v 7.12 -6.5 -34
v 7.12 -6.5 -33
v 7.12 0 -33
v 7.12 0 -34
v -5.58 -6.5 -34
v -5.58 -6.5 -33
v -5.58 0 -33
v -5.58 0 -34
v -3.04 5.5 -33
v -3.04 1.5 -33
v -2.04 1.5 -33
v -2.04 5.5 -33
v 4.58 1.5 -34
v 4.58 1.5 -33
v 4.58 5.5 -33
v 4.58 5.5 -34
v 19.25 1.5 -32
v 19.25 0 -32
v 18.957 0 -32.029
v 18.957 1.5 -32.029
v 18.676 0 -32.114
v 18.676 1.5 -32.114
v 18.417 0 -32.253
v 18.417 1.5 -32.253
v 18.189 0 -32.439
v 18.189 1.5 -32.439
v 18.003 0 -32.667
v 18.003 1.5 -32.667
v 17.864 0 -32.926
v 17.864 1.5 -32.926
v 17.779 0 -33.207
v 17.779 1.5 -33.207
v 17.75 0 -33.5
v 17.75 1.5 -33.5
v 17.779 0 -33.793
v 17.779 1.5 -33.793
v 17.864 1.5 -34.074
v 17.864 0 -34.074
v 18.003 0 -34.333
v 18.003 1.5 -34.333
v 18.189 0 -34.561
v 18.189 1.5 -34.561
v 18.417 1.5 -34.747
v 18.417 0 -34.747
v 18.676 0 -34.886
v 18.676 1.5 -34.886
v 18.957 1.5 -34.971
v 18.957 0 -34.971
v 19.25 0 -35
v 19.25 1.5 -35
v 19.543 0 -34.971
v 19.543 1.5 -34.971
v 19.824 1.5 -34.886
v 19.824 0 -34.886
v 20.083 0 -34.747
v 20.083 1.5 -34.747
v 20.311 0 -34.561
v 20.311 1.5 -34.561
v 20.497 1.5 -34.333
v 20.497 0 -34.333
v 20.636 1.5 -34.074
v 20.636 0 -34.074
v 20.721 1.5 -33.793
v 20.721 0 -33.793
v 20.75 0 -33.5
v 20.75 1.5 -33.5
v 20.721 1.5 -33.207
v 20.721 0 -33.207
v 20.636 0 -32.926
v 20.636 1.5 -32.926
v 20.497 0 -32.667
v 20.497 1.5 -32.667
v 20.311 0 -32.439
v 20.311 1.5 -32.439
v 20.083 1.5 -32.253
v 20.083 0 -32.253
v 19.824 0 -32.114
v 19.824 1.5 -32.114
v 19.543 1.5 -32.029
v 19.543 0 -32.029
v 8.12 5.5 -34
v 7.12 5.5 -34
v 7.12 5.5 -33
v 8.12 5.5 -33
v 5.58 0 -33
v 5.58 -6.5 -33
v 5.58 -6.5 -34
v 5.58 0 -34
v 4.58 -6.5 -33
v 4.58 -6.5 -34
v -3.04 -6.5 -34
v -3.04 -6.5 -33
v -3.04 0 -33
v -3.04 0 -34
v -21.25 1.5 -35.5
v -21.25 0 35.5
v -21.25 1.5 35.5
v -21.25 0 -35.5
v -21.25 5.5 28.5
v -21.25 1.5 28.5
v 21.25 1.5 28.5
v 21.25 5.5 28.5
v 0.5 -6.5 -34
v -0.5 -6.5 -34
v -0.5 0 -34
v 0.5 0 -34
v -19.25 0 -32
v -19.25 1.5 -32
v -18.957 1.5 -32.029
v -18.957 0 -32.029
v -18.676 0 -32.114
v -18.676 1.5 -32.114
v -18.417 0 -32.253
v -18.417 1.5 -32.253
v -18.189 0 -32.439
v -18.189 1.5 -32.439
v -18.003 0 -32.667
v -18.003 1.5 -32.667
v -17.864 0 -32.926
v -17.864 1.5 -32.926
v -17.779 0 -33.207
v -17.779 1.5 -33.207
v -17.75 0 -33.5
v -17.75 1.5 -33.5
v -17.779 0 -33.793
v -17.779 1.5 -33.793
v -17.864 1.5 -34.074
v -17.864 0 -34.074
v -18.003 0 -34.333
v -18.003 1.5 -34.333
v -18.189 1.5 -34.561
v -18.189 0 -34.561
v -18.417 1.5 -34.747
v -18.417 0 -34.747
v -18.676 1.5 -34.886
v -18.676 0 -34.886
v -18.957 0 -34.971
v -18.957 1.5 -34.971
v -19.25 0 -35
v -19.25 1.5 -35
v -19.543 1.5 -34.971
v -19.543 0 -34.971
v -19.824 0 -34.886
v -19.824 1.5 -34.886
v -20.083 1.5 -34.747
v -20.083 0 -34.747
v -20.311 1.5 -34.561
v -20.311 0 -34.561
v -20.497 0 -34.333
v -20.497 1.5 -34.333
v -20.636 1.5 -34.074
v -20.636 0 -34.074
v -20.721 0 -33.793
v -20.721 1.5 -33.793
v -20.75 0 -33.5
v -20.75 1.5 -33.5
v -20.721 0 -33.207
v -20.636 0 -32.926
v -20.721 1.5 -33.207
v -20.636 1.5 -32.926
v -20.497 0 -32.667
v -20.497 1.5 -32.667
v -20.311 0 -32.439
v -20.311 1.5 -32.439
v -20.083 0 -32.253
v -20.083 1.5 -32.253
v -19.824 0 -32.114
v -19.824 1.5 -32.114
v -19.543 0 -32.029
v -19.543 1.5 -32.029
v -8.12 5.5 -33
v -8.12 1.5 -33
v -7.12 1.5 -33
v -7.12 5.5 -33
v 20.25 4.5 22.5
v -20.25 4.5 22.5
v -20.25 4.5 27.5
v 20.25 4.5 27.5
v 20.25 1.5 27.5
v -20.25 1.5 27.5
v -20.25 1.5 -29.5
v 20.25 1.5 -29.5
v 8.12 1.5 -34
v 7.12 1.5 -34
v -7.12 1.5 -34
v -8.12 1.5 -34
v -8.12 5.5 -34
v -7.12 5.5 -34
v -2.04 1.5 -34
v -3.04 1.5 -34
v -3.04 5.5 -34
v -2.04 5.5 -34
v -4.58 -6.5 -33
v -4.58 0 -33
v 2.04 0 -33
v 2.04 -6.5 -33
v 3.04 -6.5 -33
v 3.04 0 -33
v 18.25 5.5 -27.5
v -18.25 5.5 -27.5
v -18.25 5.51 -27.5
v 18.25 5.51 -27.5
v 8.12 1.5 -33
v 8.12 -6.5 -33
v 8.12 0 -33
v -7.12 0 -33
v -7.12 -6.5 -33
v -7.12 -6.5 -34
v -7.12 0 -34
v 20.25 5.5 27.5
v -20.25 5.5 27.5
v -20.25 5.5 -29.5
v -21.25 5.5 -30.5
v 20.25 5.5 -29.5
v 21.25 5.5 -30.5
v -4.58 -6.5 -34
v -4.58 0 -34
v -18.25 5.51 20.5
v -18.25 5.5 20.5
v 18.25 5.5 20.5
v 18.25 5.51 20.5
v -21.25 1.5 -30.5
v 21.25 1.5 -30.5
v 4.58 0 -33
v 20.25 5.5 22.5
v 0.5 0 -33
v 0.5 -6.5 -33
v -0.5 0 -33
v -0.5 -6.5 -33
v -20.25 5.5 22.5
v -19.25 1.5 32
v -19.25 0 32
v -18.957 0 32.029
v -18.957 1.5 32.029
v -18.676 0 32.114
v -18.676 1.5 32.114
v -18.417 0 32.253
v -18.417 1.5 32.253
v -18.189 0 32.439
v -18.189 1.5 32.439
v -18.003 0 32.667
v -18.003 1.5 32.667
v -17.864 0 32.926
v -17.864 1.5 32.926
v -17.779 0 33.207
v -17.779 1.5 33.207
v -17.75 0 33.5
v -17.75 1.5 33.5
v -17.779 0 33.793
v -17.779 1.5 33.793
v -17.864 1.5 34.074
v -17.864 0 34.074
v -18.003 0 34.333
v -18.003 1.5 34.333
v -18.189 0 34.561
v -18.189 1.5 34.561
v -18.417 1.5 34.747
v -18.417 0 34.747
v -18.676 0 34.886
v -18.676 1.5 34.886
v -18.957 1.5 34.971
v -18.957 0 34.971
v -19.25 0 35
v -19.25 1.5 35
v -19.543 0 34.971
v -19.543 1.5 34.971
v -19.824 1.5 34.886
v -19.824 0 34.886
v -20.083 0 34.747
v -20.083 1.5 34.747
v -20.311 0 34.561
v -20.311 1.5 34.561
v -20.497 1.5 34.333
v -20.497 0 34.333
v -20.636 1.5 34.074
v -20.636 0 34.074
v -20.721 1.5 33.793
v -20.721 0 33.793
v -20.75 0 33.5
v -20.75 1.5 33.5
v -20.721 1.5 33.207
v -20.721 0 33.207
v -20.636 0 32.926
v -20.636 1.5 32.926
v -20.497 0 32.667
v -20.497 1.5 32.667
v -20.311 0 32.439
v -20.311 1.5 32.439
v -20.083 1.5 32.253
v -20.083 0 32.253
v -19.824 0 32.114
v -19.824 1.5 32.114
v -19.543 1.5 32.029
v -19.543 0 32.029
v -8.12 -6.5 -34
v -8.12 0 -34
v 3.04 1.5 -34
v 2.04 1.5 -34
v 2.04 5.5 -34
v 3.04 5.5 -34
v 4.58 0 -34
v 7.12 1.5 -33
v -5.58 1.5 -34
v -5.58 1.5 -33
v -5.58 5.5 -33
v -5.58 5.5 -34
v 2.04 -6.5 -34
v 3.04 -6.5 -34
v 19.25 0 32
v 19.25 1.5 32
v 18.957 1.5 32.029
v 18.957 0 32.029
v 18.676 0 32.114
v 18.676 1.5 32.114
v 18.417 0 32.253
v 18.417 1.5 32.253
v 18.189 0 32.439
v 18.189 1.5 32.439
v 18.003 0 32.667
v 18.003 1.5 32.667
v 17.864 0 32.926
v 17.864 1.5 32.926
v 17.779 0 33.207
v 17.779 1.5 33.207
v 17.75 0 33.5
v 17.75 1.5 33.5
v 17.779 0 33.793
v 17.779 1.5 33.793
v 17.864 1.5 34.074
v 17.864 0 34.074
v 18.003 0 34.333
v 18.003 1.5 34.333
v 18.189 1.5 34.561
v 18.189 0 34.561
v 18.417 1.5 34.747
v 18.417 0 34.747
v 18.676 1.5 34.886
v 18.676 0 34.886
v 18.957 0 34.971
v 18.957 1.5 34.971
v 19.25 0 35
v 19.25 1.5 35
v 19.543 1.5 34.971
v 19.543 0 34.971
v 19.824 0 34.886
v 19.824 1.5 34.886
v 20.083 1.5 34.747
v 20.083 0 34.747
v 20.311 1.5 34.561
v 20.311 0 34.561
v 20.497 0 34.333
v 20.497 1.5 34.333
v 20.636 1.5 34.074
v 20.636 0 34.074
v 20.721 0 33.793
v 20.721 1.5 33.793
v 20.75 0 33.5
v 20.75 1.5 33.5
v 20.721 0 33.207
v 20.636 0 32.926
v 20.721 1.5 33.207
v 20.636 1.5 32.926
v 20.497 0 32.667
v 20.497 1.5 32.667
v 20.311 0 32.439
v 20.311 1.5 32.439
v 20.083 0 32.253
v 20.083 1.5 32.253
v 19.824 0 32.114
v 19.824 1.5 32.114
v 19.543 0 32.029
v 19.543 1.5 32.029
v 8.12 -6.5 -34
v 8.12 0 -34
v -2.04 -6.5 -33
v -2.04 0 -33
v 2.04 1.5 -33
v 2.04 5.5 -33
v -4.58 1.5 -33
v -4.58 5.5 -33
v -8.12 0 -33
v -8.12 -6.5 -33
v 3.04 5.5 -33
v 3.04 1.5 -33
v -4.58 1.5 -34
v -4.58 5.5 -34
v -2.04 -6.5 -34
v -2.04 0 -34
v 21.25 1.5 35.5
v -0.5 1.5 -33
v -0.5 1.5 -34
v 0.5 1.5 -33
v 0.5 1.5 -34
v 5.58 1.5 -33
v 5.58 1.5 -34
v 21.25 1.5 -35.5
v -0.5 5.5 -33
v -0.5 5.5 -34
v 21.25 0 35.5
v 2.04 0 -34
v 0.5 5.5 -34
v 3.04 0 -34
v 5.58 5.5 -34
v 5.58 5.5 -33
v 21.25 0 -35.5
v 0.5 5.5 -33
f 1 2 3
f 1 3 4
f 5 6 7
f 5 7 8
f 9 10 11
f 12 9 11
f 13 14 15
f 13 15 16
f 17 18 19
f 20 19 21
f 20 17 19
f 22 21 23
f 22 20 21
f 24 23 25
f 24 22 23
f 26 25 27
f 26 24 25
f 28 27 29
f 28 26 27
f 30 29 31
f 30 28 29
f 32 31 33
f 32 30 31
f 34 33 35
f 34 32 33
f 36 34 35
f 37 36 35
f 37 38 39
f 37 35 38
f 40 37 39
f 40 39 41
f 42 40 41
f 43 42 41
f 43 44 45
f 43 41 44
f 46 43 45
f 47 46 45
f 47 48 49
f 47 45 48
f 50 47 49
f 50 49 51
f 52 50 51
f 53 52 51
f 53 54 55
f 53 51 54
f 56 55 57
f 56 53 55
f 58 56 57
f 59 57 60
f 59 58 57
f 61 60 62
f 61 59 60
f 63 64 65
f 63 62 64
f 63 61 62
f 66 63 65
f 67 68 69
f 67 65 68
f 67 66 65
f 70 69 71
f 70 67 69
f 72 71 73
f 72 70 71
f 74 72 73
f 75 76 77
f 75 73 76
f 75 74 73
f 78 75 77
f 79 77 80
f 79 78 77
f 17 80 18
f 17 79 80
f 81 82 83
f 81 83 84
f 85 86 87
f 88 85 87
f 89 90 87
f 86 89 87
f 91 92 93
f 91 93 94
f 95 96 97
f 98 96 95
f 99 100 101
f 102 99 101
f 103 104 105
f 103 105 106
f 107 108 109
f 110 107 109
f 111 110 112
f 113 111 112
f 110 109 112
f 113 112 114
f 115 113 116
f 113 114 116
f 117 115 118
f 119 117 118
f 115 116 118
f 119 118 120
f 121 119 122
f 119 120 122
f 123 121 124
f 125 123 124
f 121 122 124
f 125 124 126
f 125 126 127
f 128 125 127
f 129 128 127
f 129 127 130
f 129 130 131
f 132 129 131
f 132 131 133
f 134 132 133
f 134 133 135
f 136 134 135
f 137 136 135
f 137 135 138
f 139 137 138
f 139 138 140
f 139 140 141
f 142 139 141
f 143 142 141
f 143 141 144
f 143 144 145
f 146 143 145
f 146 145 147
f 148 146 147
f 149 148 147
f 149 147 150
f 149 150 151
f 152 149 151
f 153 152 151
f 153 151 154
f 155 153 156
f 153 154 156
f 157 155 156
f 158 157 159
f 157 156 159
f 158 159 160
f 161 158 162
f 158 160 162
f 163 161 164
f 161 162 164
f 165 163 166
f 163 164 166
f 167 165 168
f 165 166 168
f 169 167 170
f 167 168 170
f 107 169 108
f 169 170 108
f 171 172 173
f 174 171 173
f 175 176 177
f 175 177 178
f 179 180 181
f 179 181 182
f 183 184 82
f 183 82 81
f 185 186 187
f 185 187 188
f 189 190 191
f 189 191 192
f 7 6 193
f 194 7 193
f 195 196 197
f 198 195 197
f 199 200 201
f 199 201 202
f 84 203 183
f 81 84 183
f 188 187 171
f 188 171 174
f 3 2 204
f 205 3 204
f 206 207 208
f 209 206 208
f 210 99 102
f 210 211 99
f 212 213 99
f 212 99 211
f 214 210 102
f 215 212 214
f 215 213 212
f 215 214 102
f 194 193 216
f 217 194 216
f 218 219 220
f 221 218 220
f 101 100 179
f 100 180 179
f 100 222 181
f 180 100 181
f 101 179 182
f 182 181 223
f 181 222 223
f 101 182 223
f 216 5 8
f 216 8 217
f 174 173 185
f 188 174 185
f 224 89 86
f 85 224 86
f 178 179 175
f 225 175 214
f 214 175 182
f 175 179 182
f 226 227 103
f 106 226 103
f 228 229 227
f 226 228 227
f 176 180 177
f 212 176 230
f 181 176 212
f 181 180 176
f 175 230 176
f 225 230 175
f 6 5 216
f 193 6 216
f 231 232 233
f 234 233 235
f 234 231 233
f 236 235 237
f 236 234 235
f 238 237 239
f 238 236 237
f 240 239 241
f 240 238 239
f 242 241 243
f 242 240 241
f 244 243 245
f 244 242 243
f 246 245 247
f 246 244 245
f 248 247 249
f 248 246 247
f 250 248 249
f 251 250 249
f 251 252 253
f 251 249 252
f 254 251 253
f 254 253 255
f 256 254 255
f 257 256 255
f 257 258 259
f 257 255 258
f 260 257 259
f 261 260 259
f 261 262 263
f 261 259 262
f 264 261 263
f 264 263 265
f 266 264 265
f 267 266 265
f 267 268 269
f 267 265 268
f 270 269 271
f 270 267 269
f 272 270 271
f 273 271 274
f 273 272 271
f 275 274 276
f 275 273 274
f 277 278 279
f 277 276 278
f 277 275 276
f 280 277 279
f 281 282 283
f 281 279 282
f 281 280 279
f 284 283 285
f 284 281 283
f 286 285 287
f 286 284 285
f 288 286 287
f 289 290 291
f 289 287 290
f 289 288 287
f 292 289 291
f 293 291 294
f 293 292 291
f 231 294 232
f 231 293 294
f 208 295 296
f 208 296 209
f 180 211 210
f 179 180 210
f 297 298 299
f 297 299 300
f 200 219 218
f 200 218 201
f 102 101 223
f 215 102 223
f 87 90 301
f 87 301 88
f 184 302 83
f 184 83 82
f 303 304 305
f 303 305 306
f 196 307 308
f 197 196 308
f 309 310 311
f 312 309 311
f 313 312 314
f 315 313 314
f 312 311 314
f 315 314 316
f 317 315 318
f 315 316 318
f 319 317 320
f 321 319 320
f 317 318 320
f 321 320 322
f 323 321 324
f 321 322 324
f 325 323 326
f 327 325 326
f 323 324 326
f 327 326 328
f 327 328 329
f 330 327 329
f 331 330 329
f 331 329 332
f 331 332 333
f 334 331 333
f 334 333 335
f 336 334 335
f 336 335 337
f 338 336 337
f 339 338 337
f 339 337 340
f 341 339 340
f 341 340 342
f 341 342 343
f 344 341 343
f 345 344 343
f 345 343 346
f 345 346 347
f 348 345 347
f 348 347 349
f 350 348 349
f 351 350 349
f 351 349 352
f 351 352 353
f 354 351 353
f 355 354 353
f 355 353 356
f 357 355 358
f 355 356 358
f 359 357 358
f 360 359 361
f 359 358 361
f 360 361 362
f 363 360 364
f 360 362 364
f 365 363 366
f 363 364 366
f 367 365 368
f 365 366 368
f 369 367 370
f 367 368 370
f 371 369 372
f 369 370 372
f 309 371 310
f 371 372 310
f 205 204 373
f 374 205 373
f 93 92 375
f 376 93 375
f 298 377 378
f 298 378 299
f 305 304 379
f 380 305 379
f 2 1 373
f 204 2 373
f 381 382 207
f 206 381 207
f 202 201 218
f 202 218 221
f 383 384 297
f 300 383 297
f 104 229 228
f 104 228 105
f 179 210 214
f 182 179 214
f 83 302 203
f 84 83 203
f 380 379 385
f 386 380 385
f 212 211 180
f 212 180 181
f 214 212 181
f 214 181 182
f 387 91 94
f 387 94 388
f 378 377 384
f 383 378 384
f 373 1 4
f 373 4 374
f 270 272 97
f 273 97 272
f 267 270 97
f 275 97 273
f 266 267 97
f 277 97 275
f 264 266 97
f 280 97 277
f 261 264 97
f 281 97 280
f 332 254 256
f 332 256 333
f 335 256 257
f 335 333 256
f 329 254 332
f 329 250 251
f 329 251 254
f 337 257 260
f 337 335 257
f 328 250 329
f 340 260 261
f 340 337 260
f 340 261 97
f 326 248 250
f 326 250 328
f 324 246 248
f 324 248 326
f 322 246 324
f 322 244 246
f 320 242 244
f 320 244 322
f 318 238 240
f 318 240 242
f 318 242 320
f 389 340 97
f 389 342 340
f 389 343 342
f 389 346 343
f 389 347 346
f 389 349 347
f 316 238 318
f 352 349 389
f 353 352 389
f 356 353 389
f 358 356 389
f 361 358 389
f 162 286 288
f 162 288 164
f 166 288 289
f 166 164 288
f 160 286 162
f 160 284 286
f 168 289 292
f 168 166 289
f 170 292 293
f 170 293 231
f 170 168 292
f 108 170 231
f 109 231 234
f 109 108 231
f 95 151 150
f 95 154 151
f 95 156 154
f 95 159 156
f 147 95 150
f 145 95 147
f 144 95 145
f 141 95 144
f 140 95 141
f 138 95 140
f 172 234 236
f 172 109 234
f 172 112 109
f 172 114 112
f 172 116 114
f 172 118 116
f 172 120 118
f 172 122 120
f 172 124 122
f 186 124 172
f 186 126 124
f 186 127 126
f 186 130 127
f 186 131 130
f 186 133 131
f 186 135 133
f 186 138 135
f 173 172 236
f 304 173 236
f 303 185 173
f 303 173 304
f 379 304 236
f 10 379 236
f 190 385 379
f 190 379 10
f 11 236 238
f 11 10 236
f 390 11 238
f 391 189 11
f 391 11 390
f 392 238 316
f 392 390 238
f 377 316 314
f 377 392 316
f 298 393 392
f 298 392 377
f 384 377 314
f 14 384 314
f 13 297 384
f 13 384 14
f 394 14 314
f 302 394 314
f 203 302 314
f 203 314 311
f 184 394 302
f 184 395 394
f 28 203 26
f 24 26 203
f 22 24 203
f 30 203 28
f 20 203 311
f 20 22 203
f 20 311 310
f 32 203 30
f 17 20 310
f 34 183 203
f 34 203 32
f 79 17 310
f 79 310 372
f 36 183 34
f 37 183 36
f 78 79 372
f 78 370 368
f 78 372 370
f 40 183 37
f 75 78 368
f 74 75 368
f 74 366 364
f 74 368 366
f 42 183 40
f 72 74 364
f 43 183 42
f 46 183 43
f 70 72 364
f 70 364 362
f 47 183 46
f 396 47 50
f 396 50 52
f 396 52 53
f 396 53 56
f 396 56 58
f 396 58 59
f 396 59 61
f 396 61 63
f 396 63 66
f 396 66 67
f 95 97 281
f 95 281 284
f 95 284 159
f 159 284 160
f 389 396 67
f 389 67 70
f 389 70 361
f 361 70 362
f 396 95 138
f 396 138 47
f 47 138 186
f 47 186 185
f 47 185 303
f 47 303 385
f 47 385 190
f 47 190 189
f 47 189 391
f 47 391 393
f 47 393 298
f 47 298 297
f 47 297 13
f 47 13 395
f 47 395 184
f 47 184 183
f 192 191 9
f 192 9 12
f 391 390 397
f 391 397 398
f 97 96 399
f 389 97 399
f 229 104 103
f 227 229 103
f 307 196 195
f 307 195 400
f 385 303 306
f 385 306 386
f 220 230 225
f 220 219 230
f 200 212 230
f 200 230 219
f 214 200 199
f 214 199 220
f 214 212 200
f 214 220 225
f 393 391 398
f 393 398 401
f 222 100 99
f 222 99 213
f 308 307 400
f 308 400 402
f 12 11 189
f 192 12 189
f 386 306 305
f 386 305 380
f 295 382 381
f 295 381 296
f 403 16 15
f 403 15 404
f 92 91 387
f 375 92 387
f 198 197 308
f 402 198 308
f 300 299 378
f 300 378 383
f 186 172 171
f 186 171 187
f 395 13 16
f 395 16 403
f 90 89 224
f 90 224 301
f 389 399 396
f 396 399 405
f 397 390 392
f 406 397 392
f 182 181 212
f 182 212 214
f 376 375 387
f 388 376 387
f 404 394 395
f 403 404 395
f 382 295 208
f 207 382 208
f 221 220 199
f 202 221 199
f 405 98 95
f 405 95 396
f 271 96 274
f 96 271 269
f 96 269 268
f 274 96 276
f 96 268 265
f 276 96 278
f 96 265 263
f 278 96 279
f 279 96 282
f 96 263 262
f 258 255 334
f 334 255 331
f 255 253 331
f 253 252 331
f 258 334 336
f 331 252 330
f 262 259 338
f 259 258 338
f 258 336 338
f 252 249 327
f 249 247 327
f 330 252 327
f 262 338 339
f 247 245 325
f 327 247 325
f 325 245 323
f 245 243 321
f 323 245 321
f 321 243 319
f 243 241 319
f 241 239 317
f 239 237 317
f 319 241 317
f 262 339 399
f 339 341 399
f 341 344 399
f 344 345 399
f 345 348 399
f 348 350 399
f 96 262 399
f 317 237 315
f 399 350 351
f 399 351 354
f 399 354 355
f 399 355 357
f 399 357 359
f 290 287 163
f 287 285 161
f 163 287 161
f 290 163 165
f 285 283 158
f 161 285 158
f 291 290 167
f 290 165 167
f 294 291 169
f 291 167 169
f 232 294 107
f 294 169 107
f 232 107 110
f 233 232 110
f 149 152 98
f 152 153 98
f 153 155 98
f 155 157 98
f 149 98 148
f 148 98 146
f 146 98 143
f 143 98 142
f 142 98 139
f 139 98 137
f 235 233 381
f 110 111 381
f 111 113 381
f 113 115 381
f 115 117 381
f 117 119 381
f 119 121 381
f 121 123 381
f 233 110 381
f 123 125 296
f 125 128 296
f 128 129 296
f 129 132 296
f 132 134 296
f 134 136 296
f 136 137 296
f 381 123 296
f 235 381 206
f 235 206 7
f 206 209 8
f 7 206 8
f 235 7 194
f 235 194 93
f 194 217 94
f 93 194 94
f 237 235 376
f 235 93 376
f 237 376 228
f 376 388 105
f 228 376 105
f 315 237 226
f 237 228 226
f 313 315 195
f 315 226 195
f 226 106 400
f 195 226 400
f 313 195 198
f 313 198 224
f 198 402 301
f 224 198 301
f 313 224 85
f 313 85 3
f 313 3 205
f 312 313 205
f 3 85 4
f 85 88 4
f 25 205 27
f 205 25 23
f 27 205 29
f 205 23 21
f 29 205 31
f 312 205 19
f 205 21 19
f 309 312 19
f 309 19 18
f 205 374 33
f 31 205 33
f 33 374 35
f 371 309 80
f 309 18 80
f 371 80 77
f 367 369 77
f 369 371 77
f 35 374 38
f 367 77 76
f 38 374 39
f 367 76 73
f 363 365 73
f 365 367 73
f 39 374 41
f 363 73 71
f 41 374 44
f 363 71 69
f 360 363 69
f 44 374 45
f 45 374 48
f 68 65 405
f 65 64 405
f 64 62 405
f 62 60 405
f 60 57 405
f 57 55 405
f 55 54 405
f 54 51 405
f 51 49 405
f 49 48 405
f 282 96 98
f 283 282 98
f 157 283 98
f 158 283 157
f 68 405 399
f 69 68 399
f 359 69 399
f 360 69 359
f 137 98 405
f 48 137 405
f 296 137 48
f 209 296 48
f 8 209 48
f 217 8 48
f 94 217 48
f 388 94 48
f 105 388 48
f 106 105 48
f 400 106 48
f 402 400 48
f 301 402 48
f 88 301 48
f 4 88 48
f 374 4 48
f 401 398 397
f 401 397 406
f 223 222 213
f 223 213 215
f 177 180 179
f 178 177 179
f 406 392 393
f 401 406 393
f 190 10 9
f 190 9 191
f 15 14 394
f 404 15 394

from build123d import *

# Parameters (mm, degrees)
SKETCH1_W                                  = 42.5
SKETCH1_H                                  = 71
BOSS_EXTRUDE1_DEPTH                        = 1.5
SKETCH7_R                                  = 1.5
CUT_EXTRUDE2_DEPTH                         = 42.401237904
MIRROR1_AT_THE_SECOND_PLANE_COPY_1_SKETC_R = 1.5
MIRROR1_AT_THE_SECOND_PLANE_COPY_1_DEPTH   = 42.401237904
BOSS_EXTRUDE5_START                        = -8
SKETCH8_W                                  = 1
SKETCH8_H                                  = 1
BOSS_EXTRUDE5_DEPTH                        = 12
LPATTERN1_COUNT                            = 4
LPATTERN1_PITCH                            = 2.54
LPATTERN1_COL_COUNT                        = 4
LPATTERN1_COL_PITCH                        = 2.54
SKETCH2_W                                  = 42.5
SKETCH2_H                                  = 59
BOSS_EXTRUDE2_DEPTH                        = 4
SKETCH3_W                                  = 40.5
SKETCH3_H                                  = 57
CUT_EXTRUDE1_DEPTH                         = 44.079142285
SKETCH5_W                                  = 40.5
SKETCH5_H                                  = 57
BOSS_EXTRUDE3_DEPTH                        = 4
SKETCH9_W                                  = 40.5
SKETCH9_H                                  = 5
CUT_EXTRUDE3_DEPTH                         = 1
SKETCH6_W                                  = 36.5
SKETCH6_H                                  = 48
BOSS_EXTRUDE4_DEPTH                        = 0.01


with BuildPart() as part:
    # Sketch1 → Boss-Extrude1 (new body)
    with BuildSketch(Plane(origin=(0, 0, 0), x_dir=(1, 0, 0), z_dir=(0, 1, 0))):
        Rectangle(SKETCH1_W, SKETCH1_H)
    extrude(amount=BOSS_EXTRUDE1_DEPTH)

    # Sketch7 → Cut-Extrude2 (cut, through all)
    with BuildSketch(Plane(origin=(0, 1.5, 0), x_dir=(1, 0, 0), z_dir=(0, 1, 0))):
        with Locations(Location((-19.25, 33.5, 0), (0, 0, 270))):
            Circle(SKETCH7_R)
    cut_extrude2 = extrude(amount=-CUT_EXTRUDE2_DEPTH, mode=Mode.SUBTRACT)

    # Mirror1: Cut-Extrude2 across plane
    add(cut_extrude2.mirror(Plane.XY), mode=Mode.SUBTRACT)

    # Mirror1 at the second plane: Cut-Extrude2 across plane
    add(cut_extrude2.mirror(Plane(origin=(0, 0, 0), x_dir=(0, 0, 1), z_dir=(1, 0, 0))), mode=Mode.SUBTRACT)

    # Mirror1 at the second plane copy 1 sketc → Mirror1 at the second plane copy 1 (cut, through all)
    with BuildSketch(Plane(origin=(0, 1.5, 0), x_dir=(-1, 0, 0), z_dir=(0, 1, 0))):
        with Locations(Location((-19.25, 33.5, 0), (0, 0, 270))):
            Circle(MIRROR1_AT_THE_SECOND_PLANE_COPY_1_SKETC_R)
    extrude(amount=-MIRROR1_AT_THE_SECOND_PLANE_COPY_1_DEPTH, mode=Mode.SUBTRACT)

    # Sketch8 → Boss-Extrude5 (add)
    with BuildSketch(Plane(origin=(0, 1.5, 0), x_dir=(1, 0, 0), z_dir=(0, 1, 0)).offset(BOSS_EXTRUDE5_START)):
        with Locations((0, 33.5)):
            Rectangle(SKETCH8_W, SKETCH8_H)
    boss_extrude5 = extrude(amount=BOSS_EXTRUDE5_DEPTH)

    # LPattern1: Boss-Extrude5 ×4
    with Locations(*[(i * LPATTERN1_PITCH, 0, 0) for i in range(1, LPATTERN1_COUNT)]):
        add(boss_extrude5)

    # LPattern1 col: Boss-Extrude5 ×4
    with Locations(*[(-i * LPATTERN1_COL_PITCH, 0, 0) for i in range(1, LPATTERN1_COL_COUNT)]):
        add(boss_extrude5)


with BuildPart() as body_2:
    # Sketch2 → Boss-Extrude2 (new body)
    with BuildSketch(Plane(origin=(0, 1.5, 0), x_dir=(1, 0, 0), z_dir=(0, 1, 0))):
        with Locations((0, 1)):
            Rectangle(SKETCH2_W, SKETCH2_H)
    extrude(amount=BOSS_EXTRUDE2_DEPTH)

    # Sketch3 → Cut-Extrude1 (cut, through all)
    with BuildSketch(Plane(origin=(0, 5.5, 0), x_dir=(1, 0, 0), z_dir=(0, 1, 0))):
        with Locations((0, 1)):
            Rectangle(SKETCH3_W, SKETCH3_H)
    extrude(amount=-CUT_EXTRUDE1_DEPTH, mode=Mode.SUBTRACT)


with BuildPart() as body_3:
    # Sketch5 → Boss-Extrude3 (new body)
    with BuildSketch(Plane(origin=(0, 1.5, 0), x_dir=(1, 0, 0), z_dir=(0, 1, 0))):
        with Locations((0, 1)):
            Rectangle(SKETCH5_W, SKETCH5_H)
    extrude(amount=BOSS_EXTRUDE3_DEPTH)

    # Sketch9 → Cut-Extrude3 (cut)
    with BuildSketch(Plane(origin=(0, 5.5, 0), x_dir=(1, 0, 0), z_dir=(0, 1, 0))):
        with Locations((0, -25)):
            Rectangle(SKETCH9_W, SKETCH9_H)
    extrude(amount=-CUT_EXTRUDE3_DEPTH, mode=Mode.SUBTRACT)

    # Sketch6 → Boss-Extrude4 (add)
    with BuildSketch(Plane(origin=(0, 5.5, 0), x_dir=(1, 0, 0), z_dir=(0, 1, 0))):
        with Locations((0, 3.5)):
            Rectangle(SKETCH6_W, SKETCH6_H)
    extrude(amount=BOSS_EXTRUDE4_DEPTH)


solid = Compound([part.part, body_2.part, body_3.part])
